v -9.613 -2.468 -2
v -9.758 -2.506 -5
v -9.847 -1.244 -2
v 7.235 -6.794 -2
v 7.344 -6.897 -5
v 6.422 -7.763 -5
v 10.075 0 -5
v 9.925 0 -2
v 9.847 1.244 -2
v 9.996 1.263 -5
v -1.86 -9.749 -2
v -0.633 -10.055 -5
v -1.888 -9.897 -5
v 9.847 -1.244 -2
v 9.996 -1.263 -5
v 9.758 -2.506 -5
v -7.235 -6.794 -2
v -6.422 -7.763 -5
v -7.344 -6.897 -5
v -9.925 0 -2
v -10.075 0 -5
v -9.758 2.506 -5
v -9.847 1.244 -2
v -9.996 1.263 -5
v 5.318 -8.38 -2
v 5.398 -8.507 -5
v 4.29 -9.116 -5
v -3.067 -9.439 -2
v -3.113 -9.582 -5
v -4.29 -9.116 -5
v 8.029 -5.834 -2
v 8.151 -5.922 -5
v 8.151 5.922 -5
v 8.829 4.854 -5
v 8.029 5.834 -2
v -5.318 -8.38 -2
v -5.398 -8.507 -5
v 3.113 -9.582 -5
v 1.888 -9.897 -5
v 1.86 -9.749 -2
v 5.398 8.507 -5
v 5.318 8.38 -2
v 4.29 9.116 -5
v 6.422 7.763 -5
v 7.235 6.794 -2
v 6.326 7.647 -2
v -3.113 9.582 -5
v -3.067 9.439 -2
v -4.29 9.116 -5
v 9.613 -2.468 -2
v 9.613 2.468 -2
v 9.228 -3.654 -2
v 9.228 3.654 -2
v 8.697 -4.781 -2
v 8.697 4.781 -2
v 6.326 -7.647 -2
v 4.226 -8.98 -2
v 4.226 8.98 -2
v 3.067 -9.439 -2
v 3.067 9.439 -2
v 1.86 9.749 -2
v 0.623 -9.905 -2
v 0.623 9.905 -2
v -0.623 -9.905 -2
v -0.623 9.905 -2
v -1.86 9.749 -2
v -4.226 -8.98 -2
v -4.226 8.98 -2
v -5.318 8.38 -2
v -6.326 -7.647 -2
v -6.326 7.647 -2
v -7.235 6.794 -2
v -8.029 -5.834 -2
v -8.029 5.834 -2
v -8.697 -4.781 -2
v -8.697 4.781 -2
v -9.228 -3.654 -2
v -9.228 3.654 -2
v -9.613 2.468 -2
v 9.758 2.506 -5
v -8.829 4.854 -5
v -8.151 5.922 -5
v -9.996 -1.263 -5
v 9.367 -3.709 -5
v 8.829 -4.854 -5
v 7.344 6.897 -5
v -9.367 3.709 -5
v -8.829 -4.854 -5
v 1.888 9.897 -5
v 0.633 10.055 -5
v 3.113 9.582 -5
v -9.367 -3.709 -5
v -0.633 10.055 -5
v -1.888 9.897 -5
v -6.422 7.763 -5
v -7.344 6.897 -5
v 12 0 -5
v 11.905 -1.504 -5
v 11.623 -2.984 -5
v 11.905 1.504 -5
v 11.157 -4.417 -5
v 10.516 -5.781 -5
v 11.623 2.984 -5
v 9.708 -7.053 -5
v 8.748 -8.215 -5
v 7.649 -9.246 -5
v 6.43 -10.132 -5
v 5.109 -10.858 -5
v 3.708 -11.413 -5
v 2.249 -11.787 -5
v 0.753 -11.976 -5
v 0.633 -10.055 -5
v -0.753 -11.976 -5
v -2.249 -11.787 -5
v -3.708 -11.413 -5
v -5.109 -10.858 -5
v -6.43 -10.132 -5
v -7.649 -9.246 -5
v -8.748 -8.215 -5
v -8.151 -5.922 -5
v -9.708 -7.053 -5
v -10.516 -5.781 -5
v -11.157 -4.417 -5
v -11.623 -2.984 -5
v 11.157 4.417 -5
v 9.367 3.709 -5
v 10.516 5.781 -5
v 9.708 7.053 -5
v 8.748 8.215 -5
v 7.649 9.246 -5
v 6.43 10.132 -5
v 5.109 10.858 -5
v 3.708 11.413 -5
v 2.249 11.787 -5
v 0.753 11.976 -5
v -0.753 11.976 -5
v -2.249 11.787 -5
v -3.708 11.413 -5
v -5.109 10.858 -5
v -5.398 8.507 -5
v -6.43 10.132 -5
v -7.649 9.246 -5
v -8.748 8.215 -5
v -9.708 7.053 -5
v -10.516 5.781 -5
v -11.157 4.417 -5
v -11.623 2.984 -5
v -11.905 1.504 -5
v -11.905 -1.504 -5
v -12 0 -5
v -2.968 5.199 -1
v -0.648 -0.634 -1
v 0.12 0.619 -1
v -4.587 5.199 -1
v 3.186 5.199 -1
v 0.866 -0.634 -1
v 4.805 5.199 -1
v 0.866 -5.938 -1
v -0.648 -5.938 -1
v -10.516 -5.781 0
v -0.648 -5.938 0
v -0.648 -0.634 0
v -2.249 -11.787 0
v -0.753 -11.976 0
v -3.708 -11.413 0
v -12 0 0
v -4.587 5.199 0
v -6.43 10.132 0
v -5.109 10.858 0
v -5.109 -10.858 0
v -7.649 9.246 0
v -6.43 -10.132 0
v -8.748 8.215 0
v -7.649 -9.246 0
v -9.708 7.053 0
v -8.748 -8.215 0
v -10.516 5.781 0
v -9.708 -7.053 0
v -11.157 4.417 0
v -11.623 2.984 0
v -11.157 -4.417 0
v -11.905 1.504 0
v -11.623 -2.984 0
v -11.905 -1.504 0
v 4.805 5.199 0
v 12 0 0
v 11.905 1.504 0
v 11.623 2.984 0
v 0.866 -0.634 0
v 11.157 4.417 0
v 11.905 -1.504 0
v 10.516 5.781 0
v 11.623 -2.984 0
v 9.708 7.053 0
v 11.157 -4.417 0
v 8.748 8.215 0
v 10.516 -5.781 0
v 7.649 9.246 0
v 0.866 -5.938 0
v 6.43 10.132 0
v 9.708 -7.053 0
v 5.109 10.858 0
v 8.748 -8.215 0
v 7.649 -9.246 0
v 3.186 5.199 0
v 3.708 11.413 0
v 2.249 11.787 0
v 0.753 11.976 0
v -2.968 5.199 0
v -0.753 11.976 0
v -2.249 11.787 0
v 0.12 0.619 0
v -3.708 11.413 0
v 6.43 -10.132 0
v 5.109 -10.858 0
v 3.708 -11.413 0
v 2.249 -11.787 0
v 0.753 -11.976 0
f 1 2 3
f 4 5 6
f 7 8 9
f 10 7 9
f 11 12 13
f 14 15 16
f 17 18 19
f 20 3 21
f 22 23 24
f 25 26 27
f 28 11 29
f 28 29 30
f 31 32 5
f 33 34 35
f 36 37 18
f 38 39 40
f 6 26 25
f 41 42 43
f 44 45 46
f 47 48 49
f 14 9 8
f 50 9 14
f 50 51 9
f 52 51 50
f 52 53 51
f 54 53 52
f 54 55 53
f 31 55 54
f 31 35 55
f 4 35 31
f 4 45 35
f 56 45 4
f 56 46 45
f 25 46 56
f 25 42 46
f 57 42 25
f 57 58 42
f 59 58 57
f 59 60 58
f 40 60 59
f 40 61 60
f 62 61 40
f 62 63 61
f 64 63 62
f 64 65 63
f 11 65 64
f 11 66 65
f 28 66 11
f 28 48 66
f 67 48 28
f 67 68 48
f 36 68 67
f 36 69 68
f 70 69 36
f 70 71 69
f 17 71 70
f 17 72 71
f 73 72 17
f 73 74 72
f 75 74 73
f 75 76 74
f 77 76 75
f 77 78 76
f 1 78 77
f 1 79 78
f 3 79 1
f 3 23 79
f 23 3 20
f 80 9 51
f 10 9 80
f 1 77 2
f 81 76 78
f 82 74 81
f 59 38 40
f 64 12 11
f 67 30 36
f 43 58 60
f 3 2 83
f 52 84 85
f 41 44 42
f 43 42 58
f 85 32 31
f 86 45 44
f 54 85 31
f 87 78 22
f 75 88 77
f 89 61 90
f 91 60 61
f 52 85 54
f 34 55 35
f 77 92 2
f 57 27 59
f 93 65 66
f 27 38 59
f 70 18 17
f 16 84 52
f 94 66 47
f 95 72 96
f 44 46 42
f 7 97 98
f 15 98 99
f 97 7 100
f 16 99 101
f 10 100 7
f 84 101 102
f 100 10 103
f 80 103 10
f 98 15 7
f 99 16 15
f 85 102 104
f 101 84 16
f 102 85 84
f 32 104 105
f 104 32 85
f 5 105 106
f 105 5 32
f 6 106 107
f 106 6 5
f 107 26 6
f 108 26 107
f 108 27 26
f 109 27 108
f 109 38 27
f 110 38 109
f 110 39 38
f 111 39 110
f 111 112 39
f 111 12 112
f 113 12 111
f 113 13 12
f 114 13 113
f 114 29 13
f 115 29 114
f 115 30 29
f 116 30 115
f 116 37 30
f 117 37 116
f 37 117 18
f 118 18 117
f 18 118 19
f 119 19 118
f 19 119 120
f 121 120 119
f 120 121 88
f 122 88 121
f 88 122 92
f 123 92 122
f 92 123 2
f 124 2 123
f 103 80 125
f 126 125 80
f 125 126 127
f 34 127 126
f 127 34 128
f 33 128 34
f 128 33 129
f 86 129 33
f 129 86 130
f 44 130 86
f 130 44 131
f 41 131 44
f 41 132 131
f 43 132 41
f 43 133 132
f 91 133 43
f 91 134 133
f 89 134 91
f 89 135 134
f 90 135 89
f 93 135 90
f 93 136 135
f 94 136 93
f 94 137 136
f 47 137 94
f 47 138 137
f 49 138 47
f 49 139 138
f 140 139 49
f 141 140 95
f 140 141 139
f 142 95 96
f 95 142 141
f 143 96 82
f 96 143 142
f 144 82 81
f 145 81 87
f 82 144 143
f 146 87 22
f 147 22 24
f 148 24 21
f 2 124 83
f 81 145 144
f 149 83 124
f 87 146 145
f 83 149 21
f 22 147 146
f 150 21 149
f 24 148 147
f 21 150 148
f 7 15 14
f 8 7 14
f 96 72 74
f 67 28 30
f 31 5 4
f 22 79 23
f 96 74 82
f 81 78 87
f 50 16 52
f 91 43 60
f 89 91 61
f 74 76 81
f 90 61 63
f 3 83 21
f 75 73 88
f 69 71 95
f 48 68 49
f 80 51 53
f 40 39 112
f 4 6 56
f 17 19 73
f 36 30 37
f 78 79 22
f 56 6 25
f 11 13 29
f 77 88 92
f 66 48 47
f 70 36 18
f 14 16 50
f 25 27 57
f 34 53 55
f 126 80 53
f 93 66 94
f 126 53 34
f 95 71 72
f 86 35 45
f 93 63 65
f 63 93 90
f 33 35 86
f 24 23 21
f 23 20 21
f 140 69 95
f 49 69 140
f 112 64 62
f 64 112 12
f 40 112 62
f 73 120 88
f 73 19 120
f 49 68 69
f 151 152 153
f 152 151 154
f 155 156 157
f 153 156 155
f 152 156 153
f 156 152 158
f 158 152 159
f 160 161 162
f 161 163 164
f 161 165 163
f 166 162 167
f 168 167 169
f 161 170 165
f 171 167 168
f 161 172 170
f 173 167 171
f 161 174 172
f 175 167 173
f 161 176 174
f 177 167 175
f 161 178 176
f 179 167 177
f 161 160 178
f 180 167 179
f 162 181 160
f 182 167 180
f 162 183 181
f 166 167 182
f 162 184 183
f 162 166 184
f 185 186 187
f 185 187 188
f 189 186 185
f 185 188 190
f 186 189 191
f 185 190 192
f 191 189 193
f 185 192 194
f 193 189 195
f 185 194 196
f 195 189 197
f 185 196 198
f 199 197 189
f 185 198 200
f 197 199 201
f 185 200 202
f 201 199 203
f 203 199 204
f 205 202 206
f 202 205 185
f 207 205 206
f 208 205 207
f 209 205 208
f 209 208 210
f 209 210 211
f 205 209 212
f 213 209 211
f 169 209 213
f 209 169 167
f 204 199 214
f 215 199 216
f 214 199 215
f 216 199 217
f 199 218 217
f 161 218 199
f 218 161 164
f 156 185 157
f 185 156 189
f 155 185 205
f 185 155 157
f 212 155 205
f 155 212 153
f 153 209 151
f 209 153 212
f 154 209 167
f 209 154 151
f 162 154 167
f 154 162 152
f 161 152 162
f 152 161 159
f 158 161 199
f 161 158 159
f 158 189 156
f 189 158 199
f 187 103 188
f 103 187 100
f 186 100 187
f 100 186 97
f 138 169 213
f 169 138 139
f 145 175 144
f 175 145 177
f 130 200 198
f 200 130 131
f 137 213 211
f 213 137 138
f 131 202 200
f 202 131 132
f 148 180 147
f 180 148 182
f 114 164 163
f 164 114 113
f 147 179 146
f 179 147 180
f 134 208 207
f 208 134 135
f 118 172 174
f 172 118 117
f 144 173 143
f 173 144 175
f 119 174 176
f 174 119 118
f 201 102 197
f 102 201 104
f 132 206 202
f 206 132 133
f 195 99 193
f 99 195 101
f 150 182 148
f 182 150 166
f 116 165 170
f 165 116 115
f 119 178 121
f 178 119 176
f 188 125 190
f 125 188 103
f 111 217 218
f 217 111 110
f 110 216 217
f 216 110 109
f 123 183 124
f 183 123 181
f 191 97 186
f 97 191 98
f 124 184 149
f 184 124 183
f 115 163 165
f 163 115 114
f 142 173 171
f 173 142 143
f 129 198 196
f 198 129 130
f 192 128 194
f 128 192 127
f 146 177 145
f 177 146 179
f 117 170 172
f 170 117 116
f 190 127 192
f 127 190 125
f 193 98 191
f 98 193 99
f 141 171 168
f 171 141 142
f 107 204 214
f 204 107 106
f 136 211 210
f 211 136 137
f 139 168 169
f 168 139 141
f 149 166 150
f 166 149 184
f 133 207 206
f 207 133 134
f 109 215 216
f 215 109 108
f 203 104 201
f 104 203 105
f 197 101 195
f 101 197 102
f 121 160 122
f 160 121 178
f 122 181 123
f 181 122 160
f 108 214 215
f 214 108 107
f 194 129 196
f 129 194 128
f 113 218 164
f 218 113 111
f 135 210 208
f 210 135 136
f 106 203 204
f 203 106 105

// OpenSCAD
$fn = 50;

difference() {
	union() {
		translate(v = [0, 0, -5.0]) {
			cylinder(h = 5, r = 12.0);
		}
	}
	union() {
		#translate(v = [0, 0, -5.0]) {
			cylinder(h = 3, r1 = 10.075, r2 = 9.925);
		}
		translate(v = [0, -0.5, -1]) {
			linear_extrude(height = 1) {
				text(font = "Webdings", halign = "center", size = 11, text = "Y", valign = "center");
			}
		}
	}
}
